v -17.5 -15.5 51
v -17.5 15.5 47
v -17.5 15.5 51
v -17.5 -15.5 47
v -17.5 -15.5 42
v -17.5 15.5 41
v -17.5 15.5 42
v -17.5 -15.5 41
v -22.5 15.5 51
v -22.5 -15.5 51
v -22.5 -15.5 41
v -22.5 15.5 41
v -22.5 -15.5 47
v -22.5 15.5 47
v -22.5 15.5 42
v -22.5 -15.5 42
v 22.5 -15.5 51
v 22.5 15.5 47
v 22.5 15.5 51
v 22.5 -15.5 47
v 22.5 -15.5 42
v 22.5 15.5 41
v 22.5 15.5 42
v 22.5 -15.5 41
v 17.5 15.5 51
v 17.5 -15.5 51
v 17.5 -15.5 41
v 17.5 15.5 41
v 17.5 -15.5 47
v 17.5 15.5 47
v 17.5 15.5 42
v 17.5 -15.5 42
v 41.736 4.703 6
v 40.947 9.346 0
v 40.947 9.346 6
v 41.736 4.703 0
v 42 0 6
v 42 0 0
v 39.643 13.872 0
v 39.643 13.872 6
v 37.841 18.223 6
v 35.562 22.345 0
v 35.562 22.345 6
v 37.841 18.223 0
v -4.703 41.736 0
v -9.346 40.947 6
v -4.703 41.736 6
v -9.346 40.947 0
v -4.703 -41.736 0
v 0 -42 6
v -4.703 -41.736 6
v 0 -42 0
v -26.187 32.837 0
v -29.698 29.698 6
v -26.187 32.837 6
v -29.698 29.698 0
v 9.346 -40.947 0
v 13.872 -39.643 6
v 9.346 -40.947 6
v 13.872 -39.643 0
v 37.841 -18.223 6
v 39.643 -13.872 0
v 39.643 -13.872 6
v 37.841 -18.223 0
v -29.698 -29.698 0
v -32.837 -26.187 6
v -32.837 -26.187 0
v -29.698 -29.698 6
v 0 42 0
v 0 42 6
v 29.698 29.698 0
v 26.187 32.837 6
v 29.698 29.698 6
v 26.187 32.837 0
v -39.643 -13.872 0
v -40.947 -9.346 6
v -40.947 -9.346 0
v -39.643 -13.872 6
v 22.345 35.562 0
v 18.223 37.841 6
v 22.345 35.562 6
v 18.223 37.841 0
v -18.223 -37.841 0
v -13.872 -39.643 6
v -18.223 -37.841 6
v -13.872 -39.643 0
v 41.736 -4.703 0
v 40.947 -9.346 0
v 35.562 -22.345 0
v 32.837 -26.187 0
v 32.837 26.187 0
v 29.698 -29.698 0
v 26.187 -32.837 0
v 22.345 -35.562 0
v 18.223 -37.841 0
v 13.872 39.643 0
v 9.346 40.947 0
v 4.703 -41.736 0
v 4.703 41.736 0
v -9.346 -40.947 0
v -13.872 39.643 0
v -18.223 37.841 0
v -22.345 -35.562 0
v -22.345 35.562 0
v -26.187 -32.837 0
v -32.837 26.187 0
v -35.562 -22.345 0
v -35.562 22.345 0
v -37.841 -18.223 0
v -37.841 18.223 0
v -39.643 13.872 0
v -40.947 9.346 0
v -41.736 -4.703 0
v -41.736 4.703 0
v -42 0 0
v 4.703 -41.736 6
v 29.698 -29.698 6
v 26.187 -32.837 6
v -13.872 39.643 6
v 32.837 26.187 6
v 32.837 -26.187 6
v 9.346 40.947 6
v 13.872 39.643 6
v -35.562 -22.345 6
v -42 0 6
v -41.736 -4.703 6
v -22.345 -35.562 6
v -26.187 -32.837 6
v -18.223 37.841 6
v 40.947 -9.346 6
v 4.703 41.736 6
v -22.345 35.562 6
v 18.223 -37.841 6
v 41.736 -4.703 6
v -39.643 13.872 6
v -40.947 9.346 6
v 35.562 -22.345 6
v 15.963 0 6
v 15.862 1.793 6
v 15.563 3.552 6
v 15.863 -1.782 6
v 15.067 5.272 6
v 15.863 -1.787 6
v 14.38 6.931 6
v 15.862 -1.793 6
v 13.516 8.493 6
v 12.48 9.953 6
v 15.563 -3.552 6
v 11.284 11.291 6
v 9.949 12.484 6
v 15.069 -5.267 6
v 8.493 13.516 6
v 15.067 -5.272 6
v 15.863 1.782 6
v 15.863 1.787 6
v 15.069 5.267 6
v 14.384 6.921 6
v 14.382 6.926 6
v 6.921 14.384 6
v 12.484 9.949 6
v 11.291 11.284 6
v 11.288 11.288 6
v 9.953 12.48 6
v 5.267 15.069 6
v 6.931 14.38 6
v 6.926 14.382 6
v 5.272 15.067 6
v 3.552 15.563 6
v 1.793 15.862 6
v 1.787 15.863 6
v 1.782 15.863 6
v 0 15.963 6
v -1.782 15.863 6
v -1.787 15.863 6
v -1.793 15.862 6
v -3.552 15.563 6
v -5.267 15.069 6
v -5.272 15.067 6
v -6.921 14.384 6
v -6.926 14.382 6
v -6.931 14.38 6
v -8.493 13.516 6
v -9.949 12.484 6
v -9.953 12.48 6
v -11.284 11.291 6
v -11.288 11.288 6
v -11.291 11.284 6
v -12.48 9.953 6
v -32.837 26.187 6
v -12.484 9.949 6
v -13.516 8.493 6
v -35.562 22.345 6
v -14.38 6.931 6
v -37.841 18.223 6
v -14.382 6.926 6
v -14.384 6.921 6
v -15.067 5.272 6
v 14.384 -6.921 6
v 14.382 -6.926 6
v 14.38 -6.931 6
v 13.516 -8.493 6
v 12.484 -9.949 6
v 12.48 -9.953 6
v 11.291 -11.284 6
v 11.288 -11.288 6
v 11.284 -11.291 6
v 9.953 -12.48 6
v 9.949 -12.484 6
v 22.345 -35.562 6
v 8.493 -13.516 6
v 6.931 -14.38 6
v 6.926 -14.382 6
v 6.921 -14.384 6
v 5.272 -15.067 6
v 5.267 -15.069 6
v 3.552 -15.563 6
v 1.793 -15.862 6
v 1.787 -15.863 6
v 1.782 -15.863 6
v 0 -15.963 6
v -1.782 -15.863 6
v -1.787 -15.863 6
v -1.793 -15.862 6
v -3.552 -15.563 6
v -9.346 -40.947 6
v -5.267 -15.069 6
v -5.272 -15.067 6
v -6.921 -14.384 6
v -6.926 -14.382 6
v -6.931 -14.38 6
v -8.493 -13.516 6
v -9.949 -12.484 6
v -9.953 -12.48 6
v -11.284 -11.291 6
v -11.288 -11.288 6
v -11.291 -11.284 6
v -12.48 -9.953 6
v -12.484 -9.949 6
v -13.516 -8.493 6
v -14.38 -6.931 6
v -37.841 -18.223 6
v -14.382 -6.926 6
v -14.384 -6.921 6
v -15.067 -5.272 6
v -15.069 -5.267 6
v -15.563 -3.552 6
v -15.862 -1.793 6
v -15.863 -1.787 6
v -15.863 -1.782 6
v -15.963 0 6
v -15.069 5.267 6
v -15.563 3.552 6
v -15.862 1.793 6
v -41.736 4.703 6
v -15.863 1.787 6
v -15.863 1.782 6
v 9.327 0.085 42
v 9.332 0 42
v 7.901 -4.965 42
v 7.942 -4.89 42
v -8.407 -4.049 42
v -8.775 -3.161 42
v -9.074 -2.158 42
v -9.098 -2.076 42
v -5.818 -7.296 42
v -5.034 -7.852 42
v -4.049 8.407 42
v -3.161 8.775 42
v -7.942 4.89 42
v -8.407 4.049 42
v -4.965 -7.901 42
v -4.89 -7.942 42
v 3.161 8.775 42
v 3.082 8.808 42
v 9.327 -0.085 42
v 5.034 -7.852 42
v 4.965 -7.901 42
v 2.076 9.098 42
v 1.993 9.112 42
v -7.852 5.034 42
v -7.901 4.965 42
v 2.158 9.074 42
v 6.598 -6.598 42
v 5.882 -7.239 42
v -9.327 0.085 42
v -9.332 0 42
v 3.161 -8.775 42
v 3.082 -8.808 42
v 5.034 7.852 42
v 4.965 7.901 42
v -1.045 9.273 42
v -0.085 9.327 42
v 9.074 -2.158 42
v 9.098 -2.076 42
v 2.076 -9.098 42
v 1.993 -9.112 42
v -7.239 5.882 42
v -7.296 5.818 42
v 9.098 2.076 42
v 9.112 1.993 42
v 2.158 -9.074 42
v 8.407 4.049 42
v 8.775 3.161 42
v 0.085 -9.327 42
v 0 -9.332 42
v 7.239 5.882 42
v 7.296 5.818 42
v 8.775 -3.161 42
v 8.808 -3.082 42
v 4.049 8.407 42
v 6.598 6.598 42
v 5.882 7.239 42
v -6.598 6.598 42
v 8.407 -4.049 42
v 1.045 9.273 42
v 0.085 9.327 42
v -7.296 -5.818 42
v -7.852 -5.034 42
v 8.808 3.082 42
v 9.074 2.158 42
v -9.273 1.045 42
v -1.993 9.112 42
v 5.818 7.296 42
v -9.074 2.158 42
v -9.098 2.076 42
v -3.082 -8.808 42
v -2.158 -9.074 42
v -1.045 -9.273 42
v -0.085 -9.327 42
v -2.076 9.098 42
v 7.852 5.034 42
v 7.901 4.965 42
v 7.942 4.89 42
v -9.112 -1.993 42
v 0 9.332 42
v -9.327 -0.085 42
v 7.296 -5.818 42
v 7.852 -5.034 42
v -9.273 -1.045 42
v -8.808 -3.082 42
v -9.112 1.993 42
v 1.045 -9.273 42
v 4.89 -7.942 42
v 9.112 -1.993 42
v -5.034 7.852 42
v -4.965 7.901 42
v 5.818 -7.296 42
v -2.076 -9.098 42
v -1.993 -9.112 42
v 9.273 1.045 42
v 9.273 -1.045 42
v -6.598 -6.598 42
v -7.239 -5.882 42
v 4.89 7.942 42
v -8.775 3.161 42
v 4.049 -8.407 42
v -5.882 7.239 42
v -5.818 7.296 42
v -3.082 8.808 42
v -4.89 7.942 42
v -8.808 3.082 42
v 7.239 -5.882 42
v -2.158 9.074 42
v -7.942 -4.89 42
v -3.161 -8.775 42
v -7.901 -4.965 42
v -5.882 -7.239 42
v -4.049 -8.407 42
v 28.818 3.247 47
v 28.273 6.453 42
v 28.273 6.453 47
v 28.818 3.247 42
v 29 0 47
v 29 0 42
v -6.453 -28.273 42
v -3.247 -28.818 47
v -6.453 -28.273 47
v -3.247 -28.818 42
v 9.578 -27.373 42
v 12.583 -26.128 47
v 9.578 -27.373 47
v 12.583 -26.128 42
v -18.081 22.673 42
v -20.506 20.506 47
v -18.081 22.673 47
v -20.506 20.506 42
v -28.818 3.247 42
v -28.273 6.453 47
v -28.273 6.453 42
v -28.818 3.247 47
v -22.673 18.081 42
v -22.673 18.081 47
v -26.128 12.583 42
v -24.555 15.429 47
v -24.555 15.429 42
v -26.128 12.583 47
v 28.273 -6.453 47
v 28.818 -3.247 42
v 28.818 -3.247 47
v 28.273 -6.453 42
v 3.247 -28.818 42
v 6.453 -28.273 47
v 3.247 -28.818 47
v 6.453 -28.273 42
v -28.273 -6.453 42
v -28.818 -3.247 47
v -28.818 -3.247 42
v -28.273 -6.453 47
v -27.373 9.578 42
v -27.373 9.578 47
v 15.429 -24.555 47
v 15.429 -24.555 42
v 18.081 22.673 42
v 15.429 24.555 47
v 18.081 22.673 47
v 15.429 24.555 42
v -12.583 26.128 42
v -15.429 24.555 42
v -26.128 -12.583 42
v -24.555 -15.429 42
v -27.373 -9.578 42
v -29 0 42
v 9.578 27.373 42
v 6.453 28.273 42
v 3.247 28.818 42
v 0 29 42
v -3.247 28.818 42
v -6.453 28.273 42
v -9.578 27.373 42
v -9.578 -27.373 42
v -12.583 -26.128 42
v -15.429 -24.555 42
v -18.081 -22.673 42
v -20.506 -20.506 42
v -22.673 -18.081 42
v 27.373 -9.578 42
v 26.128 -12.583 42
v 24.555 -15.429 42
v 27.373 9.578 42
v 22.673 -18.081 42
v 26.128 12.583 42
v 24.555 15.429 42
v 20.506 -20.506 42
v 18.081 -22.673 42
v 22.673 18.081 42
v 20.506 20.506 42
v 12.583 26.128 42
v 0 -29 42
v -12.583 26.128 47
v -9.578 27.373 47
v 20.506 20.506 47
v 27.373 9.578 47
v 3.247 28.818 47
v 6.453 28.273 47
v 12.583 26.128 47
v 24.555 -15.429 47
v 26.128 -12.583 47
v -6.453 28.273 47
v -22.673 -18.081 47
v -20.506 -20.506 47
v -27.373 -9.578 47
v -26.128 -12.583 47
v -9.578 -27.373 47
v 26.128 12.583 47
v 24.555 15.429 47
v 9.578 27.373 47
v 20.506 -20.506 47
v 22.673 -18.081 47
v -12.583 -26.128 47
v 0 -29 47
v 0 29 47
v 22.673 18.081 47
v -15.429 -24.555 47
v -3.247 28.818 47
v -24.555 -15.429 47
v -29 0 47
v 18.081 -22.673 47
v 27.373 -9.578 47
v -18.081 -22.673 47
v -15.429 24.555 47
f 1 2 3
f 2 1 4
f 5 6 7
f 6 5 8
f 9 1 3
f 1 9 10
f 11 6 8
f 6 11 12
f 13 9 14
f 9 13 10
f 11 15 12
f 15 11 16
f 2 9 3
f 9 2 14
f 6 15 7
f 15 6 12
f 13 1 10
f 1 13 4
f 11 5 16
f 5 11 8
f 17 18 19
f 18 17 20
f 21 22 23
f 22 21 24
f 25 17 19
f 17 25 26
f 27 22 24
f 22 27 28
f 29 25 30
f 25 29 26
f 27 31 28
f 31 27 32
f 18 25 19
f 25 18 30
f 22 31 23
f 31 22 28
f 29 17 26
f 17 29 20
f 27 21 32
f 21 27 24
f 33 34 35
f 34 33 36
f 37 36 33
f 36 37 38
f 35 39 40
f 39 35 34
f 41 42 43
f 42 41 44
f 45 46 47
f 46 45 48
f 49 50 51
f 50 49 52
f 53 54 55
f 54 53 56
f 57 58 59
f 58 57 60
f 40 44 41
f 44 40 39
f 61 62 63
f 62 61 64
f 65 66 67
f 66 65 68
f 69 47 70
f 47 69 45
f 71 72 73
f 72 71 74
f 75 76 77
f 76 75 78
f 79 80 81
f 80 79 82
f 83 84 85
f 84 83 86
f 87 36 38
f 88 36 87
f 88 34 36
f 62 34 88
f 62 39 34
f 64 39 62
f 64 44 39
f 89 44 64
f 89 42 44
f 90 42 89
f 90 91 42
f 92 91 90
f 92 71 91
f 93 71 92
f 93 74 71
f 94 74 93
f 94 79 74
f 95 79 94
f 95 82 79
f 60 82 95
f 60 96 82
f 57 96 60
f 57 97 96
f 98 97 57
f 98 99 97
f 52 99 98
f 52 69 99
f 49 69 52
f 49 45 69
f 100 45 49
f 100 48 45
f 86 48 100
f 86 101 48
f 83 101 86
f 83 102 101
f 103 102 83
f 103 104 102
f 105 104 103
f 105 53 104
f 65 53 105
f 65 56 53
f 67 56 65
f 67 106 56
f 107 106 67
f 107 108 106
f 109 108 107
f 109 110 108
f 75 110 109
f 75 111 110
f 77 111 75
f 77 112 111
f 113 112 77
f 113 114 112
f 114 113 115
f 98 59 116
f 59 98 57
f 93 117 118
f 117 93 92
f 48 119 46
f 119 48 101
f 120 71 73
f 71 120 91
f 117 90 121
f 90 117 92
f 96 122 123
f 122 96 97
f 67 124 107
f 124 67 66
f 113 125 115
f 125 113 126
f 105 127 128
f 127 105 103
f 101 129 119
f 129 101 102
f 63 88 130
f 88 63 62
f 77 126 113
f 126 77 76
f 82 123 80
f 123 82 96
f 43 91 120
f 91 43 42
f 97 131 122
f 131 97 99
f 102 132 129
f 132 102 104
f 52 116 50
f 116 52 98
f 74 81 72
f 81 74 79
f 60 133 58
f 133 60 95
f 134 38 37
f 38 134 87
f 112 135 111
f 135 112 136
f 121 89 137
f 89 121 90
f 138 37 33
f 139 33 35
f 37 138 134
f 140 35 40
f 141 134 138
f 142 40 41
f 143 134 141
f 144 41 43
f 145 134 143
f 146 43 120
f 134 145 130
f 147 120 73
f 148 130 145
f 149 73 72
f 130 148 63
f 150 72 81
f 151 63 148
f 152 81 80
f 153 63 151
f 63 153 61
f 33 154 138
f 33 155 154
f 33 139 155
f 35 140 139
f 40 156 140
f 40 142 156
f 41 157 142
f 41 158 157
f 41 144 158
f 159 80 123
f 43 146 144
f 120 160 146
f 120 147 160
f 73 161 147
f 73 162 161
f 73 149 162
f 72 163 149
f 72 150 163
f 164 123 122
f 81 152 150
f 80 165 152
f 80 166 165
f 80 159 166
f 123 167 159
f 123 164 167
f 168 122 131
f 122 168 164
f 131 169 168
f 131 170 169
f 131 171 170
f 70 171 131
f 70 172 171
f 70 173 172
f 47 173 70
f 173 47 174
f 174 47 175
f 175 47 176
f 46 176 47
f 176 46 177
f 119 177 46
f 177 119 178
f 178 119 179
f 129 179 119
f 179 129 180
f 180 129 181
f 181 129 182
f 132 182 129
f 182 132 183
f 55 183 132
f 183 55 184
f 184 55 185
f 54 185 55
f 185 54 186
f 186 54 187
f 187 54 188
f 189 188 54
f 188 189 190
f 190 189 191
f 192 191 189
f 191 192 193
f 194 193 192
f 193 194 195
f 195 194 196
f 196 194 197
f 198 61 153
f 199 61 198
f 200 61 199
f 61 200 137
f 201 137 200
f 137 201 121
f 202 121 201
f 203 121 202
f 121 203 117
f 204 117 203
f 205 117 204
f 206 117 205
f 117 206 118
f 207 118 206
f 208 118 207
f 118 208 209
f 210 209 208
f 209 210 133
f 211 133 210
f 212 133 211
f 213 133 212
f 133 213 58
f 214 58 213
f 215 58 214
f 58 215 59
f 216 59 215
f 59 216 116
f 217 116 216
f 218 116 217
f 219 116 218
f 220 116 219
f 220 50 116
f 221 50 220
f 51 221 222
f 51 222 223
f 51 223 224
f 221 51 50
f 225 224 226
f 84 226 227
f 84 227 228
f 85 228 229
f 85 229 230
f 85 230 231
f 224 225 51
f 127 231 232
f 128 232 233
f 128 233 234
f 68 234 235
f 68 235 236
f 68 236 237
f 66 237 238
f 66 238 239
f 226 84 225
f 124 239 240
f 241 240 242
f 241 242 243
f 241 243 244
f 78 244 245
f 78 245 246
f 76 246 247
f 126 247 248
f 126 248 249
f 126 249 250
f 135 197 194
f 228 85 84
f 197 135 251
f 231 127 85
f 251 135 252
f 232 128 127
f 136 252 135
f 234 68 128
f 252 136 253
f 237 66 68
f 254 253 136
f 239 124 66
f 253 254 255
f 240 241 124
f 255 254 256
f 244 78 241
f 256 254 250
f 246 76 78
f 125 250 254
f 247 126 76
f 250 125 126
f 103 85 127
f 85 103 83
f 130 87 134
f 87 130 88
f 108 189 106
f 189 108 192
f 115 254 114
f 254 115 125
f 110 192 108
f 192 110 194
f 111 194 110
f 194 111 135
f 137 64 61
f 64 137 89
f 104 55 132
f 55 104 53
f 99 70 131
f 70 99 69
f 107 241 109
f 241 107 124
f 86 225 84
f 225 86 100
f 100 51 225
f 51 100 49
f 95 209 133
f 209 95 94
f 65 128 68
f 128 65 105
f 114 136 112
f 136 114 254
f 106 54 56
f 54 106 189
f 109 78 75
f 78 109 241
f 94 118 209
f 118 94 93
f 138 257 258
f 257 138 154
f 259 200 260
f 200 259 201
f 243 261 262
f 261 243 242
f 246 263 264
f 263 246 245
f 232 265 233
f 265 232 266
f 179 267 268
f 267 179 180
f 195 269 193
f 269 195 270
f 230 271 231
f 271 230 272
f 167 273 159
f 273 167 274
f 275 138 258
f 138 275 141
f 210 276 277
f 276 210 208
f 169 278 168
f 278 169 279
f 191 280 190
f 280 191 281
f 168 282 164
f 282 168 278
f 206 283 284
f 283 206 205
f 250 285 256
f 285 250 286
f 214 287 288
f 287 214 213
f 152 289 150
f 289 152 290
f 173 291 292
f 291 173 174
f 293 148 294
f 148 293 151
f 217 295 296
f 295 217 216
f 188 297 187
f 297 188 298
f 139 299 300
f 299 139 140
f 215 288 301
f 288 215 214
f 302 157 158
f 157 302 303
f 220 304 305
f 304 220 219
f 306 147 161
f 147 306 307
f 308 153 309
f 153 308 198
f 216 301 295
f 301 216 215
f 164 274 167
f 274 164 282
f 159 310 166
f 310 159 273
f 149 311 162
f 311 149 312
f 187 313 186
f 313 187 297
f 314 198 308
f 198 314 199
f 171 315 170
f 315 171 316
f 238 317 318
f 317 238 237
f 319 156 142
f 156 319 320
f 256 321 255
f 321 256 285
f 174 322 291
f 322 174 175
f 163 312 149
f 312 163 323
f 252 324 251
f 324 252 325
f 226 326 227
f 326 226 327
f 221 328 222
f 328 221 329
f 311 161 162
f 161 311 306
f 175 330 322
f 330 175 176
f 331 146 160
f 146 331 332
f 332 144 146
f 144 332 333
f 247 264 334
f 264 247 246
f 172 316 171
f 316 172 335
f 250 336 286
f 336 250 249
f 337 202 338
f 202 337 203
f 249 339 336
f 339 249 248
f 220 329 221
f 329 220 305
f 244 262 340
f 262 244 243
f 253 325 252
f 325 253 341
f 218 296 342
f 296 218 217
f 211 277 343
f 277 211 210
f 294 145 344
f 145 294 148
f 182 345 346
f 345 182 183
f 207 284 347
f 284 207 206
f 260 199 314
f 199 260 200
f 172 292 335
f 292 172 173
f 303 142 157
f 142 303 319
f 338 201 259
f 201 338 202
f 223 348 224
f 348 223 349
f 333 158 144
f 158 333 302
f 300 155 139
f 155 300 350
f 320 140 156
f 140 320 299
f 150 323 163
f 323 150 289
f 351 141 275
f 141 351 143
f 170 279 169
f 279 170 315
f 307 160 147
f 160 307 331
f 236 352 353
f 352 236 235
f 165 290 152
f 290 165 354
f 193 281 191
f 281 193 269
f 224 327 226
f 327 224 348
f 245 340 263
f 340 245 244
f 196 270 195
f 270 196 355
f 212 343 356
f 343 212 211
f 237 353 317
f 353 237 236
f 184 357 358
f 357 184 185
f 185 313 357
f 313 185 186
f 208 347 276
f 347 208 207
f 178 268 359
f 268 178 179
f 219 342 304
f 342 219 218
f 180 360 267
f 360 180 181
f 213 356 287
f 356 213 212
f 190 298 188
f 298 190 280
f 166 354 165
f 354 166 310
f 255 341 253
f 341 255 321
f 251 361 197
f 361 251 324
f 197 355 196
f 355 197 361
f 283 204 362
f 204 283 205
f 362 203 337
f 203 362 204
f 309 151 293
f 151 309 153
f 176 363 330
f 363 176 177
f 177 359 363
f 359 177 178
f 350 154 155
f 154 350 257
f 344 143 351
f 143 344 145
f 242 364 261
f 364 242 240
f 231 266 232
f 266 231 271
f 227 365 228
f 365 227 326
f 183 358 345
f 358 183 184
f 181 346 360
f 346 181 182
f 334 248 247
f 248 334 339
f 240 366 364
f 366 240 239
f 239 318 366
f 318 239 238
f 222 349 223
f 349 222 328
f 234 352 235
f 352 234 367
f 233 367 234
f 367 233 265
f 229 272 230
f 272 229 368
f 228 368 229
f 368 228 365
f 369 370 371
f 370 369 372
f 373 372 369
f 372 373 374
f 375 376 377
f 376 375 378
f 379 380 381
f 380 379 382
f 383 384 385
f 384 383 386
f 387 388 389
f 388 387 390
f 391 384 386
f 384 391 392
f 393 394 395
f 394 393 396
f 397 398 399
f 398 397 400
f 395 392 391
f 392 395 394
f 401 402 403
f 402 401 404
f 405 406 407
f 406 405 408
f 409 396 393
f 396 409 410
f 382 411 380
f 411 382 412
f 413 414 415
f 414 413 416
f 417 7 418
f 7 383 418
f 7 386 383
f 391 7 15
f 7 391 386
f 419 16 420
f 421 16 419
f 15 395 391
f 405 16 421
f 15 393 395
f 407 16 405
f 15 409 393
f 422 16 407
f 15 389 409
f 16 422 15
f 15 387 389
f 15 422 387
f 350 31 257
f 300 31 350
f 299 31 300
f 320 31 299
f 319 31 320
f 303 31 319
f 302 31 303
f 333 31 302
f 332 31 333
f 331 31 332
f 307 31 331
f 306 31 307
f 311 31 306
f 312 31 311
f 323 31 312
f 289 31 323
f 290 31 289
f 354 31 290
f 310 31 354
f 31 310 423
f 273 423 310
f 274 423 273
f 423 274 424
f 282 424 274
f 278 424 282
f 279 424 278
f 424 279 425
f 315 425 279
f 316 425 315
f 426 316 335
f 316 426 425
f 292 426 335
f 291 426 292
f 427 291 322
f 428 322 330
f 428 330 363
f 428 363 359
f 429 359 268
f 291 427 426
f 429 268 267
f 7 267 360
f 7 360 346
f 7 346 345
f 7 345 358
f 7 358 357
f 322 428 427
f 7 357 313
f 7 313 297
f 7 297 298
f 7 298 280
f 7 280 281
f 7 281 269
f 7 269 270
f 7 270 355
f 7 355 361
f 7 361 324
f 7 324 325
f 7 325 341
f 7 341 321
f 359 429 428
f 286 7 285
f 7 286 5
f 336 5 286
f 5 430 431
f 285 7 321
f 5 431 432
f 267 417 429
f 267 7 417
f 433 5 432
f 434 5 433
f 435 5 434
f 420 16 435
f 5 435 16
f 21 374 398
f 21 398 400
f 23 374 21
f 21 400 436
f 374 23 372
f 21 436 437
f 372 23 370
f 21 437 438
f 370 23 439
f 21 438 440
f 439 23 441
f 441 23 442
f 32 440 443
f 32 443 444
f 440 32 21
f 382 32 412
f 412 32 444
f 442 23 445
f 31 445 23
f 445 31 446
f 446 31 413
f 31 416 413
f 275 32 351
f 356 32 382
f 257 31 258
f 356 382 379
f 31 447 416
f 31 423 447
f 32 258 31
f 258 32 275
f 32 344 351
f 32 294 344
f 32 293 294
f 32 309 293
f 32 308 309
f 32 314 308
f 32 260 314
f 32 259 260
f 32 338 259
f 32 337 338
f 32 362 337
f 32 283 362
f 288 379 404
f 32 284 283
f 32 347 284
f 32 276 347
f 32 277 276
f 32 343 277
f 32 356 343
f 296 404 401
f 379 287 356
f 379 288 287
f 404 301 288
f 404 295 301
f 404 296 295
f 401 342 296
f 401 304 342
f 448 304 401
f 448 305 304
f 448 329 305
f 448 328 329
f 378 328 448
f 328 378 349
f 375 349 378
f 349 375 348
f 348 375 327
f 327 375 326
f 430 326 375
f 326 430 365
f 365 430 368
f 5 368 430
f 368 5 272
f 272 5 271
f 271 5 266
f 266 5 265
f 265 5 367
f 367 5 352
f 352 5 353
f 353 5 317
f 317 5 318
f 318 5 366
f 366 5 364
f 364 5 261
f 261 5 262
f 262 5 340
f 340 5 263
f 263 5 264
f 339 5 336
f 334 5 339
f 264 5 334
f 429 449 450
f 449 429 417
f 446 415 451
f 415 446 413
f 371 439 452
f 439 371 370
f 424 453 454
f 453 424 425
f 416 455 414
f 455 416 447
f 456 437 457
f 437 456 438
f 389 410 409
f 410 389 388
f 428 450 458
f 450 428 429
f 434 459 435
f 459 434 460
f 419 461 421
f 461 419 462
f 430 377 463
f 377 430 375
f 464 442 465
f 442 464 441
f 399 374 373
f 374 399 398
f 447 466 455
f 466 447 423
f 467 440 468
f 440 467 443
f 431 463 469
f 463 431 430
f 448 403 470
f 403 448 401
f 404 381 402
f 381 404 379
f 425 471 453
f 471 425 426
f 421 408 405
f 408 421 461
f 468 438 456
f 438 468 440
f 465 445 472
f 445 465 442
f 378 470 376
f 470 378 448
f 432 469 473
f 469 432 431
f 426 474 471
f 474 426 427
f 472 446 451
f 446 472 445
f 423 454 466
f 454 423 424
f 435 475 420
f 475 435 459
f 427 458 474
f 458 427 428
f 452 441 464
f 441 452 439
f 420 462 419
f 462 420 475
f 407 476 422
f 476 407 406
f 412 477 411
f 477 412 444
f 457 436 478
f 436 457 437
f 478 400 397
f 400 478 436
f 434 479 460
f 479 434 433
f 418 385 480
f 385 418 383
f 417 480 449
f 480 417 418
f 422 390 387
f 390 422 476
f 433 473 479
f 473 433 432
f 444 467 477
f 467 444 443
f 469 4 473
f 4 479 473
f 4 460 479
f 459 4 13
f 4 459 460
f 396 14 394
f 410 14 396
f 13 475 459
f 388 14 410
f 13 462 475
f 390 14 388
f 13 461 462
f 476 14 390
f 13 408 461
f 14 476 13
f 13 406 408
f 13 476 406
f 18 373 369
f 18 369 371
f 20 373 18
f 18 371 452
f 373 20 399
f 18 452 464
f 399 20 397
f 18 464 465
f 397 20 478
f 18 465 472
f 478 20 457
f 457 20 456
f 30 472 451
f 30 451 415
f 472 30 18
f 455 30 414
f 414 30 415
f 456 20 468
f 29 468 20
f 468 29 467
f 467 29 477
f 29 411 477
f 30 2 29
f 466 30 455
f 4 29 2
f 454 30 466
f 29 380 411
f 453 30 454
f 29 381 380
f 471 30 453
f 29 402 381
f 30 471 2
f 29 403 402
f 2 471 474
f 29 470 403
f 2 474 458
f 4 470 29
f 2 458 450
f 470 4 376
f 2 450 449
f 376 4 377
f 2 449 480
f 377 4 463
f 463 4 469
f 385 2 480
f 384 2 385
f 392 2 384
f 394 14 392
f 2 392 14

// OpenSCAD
// file: lib/commerce_forms.scad
// Original parametric printable prototypes. Dimensions in millimeters.
// CAD is the manufacturing authority; Three.js gallery geometry is a stylized preview.
// No external copyrighted silhouettes, brands, logos or character geometry.
$fn=56;
module market_lantern(v=1) {
  r=27+v*2; h=76+v*6; wall=2.8;
  difference() {
    cylinder(r=r,h=h);
    translate([0,0,-1]) cylinder(r=r-wall,h=h+2);
    for (tier=[0:3], j=[0:7+v]) {
      a=360*j/(8+v)+tier*15;
      rotate([0,0,a])
        translate([r-1,0,17+tier*(h-33)/3])
          rotate([0,90,0]) cylinder(r=2.2+(v%3)*.5,h=10,center=true,$fn=18);
    }
  }
}
module market_figurine(v=1) {
  r=18+v;
  union() {
    cylinder(r=29,h=6);
    translate([0,0,7]) scale([1,0.85,1.15]) sphere(r=r);
    translate([0,0,35]) scale([1,.91,.84]) sphere(r=r*.78);
    for (s=[-1,1]) {
      translate([s*(r*.58),0,49])
        rotate([0,s*13,0]) cylinder(r1=5+v*.4,r2=1,h=10+v*2);
      translate([s*(r*.73),-2,20]) scale([.36,.55,.67]) sphere(r=r*.75);
    }
    translate([0,-r*.62,39]) sphere(r=3.5+v*.2);
    for(s=[-1,1])translate([s*7,-r*.72,43])sphere(r=1.8);
  }
}
module market_scenery(v=1) {
  union() {
    translate([-52,-32,0]) cube([104,64,4]);
    for (i=[0:2+v%2]) {
      x=-40+i*24;
      translate([x, -14+(i%2)*12,3.8])
        cube([15+v*2,19,13+v*3]);
      translate([x+2,-13+(i%2)*12,16+v*3])
        cube([11+v*2,15,3]);
    }
    for(i=[-1,1]) {
      translate([i*42,20,3.8]) cylinder(r=5,h=12+v*4);
      translate([i*42,20,15+v*4]) sphere(r=6);
    }
  }
}
module market_organizer(v=1) {
  w=104+v*5;d=69+v*3;h=32+v*3; columns=2+v%3;
  difference() {
    translate([-w/2,-d/2,0]) cube([w,d,h]);
    for(i=[0:columns-1])
      translate([-w/2+3+i*(w-6)/columns,-d/2+3,4])
        cube([(w-6)/columns-3,d-6,h+3]);
  }
}
module market_display(v=1) {
  union() {
    cylinder(r=34+v*2,h=6);
    translate([0,0,5.8]) cylinder(r1=12+v,r2=9,h=26+v*3);
    translate([0,0,30+v*3]) cylinder(r=25+v,h=5);
    for(s=[-1,1])
      translate([s*(16+v),0,34+v*3])
        cube([5,31,10],center=true);
  }
}
module market_gaming(v=1) {
  w=102+v*5;d=66+v*2; h=22+v*3;
  difference() {
    union() {
      translate([-w/2,-d/2,0]) cube([w,d,h]);
      translate([-w/2, d/2-14,h-1]) cube([w,12,15+v]);
    }
    translate([-w/2+5,-d/2+5,5]) cube([w-10,d-24,h+12]);
    for(i=[-1,0,1])
      translate([i*24,d/2-13,h+6]) rotate([90,0,0])
        cylinder(r=3.6+v*.3,h=16,$fn=22);
  }
}
module market_jewelry(v=1) {
  union() {
    translate([-40,-26,0]) cube([80,52,6]);
    for (i=[0:3+v%2]) {
      x=-29+i*58/(3+v%2);
      translate([x,0,5.8]) cylinder(r=3.2,h=42+v*5,$fn=24);
      translate([x,0,46+v*5]) sphere(r=5);
    }
    translate([-33,-5,42+v*5]) cube([66,9,6]);
    for(i=[0:4])translate([-25+i*12,0,46+v*5])
      cylinder(r1=4,r2=1.5,h=7,$fn=20);
  }
}
module market_planter(v=1) {
  r=34+v*2; h=48+v*6; w=3.2;
  difference() {
    union() {
      cylinder(r=r,h=h);
      for(i=[0:9+v])
        rotate([0,0,360*i/(10+v)])
          translate([r-.5,-1.6,2]) cube([2.2,3.2,h-4]);
    }
    translate([0,0,3.8]) cylinder(r=r-w,h=h+2);
    translate([0,0,-1]) cylinder(r=2.8,h=7,$fn=24);
  }
}
module market_gift(v=1,label="CUSTOM") {
  w=100+v*6;d=49+v*3;
  difference() {
    union() {
      hull()for(x=[-w/2+7,w/2-7],y=[-d/2+7,d/2-7])
        translate([x,y,0]) cylinder(r=7,h=6,$fn=24);
      translate([0,0,5.8]) linear_extrude(height=2.2)
        text(label,size=max(9,18-v),halign="center",valign="center",
             font="Liberation Sans:style=Bold");
    }
    if(v==3)for(x=[-w/2+10,w/2-10])
      translate([x,d/2-10,-1]) cylinder(r=2.5,h=10,$fn=24);
  }
}
module market_cosplay(v=1) {
  r=28+v*2;
  difference() {
    union() {
      cylinder(r=r,h=4.5,$fn=8+v*2);
      for(i=[0:4+v])
        rotate([0,0,360*i/(5+v)])
          translate([r*.45,0,4.2]) cylinder(r=4.2,h=1.8,$fn=6);
      cylinder(r=12+v*.5,h=7,$fn=5+v);
    }
    translate([0,r*.70,-1])cylinder(r=3.3,h=10,$fn=24);
  }
}
module commercial_form(family="lantern",variant=1,label="CUSTOM") {
  if(family=="lantern")market_lantern(variant);
  else if(family=="figurine")market_figurine(variant);
  else if(family=="scenery")market_scenery(variant);
  else if(family=="organizer")market_organizer(variant);
  else if(family=="display")market_display(variant);
  else if(family=="gaming")market_gaming(variant);
  else if(family=="jewelry")market_jewelry(variant);
  else if(family=="planter")market_planter(variant);
  else if(family=="gift")market_gift(variant,label);
  else if(family=="cosplay")market_cosplay(variant);
  else assert(false,str("Unknown family: ",family));
}
// main file
// Original 3D printable CAD prototype for Miniature Tiered Riser
// Millimeter units; edit parameters and print-test before commercial shipment.
use <lib/commerce_forms.scad>
commercial_form(family="display",variant=4);
